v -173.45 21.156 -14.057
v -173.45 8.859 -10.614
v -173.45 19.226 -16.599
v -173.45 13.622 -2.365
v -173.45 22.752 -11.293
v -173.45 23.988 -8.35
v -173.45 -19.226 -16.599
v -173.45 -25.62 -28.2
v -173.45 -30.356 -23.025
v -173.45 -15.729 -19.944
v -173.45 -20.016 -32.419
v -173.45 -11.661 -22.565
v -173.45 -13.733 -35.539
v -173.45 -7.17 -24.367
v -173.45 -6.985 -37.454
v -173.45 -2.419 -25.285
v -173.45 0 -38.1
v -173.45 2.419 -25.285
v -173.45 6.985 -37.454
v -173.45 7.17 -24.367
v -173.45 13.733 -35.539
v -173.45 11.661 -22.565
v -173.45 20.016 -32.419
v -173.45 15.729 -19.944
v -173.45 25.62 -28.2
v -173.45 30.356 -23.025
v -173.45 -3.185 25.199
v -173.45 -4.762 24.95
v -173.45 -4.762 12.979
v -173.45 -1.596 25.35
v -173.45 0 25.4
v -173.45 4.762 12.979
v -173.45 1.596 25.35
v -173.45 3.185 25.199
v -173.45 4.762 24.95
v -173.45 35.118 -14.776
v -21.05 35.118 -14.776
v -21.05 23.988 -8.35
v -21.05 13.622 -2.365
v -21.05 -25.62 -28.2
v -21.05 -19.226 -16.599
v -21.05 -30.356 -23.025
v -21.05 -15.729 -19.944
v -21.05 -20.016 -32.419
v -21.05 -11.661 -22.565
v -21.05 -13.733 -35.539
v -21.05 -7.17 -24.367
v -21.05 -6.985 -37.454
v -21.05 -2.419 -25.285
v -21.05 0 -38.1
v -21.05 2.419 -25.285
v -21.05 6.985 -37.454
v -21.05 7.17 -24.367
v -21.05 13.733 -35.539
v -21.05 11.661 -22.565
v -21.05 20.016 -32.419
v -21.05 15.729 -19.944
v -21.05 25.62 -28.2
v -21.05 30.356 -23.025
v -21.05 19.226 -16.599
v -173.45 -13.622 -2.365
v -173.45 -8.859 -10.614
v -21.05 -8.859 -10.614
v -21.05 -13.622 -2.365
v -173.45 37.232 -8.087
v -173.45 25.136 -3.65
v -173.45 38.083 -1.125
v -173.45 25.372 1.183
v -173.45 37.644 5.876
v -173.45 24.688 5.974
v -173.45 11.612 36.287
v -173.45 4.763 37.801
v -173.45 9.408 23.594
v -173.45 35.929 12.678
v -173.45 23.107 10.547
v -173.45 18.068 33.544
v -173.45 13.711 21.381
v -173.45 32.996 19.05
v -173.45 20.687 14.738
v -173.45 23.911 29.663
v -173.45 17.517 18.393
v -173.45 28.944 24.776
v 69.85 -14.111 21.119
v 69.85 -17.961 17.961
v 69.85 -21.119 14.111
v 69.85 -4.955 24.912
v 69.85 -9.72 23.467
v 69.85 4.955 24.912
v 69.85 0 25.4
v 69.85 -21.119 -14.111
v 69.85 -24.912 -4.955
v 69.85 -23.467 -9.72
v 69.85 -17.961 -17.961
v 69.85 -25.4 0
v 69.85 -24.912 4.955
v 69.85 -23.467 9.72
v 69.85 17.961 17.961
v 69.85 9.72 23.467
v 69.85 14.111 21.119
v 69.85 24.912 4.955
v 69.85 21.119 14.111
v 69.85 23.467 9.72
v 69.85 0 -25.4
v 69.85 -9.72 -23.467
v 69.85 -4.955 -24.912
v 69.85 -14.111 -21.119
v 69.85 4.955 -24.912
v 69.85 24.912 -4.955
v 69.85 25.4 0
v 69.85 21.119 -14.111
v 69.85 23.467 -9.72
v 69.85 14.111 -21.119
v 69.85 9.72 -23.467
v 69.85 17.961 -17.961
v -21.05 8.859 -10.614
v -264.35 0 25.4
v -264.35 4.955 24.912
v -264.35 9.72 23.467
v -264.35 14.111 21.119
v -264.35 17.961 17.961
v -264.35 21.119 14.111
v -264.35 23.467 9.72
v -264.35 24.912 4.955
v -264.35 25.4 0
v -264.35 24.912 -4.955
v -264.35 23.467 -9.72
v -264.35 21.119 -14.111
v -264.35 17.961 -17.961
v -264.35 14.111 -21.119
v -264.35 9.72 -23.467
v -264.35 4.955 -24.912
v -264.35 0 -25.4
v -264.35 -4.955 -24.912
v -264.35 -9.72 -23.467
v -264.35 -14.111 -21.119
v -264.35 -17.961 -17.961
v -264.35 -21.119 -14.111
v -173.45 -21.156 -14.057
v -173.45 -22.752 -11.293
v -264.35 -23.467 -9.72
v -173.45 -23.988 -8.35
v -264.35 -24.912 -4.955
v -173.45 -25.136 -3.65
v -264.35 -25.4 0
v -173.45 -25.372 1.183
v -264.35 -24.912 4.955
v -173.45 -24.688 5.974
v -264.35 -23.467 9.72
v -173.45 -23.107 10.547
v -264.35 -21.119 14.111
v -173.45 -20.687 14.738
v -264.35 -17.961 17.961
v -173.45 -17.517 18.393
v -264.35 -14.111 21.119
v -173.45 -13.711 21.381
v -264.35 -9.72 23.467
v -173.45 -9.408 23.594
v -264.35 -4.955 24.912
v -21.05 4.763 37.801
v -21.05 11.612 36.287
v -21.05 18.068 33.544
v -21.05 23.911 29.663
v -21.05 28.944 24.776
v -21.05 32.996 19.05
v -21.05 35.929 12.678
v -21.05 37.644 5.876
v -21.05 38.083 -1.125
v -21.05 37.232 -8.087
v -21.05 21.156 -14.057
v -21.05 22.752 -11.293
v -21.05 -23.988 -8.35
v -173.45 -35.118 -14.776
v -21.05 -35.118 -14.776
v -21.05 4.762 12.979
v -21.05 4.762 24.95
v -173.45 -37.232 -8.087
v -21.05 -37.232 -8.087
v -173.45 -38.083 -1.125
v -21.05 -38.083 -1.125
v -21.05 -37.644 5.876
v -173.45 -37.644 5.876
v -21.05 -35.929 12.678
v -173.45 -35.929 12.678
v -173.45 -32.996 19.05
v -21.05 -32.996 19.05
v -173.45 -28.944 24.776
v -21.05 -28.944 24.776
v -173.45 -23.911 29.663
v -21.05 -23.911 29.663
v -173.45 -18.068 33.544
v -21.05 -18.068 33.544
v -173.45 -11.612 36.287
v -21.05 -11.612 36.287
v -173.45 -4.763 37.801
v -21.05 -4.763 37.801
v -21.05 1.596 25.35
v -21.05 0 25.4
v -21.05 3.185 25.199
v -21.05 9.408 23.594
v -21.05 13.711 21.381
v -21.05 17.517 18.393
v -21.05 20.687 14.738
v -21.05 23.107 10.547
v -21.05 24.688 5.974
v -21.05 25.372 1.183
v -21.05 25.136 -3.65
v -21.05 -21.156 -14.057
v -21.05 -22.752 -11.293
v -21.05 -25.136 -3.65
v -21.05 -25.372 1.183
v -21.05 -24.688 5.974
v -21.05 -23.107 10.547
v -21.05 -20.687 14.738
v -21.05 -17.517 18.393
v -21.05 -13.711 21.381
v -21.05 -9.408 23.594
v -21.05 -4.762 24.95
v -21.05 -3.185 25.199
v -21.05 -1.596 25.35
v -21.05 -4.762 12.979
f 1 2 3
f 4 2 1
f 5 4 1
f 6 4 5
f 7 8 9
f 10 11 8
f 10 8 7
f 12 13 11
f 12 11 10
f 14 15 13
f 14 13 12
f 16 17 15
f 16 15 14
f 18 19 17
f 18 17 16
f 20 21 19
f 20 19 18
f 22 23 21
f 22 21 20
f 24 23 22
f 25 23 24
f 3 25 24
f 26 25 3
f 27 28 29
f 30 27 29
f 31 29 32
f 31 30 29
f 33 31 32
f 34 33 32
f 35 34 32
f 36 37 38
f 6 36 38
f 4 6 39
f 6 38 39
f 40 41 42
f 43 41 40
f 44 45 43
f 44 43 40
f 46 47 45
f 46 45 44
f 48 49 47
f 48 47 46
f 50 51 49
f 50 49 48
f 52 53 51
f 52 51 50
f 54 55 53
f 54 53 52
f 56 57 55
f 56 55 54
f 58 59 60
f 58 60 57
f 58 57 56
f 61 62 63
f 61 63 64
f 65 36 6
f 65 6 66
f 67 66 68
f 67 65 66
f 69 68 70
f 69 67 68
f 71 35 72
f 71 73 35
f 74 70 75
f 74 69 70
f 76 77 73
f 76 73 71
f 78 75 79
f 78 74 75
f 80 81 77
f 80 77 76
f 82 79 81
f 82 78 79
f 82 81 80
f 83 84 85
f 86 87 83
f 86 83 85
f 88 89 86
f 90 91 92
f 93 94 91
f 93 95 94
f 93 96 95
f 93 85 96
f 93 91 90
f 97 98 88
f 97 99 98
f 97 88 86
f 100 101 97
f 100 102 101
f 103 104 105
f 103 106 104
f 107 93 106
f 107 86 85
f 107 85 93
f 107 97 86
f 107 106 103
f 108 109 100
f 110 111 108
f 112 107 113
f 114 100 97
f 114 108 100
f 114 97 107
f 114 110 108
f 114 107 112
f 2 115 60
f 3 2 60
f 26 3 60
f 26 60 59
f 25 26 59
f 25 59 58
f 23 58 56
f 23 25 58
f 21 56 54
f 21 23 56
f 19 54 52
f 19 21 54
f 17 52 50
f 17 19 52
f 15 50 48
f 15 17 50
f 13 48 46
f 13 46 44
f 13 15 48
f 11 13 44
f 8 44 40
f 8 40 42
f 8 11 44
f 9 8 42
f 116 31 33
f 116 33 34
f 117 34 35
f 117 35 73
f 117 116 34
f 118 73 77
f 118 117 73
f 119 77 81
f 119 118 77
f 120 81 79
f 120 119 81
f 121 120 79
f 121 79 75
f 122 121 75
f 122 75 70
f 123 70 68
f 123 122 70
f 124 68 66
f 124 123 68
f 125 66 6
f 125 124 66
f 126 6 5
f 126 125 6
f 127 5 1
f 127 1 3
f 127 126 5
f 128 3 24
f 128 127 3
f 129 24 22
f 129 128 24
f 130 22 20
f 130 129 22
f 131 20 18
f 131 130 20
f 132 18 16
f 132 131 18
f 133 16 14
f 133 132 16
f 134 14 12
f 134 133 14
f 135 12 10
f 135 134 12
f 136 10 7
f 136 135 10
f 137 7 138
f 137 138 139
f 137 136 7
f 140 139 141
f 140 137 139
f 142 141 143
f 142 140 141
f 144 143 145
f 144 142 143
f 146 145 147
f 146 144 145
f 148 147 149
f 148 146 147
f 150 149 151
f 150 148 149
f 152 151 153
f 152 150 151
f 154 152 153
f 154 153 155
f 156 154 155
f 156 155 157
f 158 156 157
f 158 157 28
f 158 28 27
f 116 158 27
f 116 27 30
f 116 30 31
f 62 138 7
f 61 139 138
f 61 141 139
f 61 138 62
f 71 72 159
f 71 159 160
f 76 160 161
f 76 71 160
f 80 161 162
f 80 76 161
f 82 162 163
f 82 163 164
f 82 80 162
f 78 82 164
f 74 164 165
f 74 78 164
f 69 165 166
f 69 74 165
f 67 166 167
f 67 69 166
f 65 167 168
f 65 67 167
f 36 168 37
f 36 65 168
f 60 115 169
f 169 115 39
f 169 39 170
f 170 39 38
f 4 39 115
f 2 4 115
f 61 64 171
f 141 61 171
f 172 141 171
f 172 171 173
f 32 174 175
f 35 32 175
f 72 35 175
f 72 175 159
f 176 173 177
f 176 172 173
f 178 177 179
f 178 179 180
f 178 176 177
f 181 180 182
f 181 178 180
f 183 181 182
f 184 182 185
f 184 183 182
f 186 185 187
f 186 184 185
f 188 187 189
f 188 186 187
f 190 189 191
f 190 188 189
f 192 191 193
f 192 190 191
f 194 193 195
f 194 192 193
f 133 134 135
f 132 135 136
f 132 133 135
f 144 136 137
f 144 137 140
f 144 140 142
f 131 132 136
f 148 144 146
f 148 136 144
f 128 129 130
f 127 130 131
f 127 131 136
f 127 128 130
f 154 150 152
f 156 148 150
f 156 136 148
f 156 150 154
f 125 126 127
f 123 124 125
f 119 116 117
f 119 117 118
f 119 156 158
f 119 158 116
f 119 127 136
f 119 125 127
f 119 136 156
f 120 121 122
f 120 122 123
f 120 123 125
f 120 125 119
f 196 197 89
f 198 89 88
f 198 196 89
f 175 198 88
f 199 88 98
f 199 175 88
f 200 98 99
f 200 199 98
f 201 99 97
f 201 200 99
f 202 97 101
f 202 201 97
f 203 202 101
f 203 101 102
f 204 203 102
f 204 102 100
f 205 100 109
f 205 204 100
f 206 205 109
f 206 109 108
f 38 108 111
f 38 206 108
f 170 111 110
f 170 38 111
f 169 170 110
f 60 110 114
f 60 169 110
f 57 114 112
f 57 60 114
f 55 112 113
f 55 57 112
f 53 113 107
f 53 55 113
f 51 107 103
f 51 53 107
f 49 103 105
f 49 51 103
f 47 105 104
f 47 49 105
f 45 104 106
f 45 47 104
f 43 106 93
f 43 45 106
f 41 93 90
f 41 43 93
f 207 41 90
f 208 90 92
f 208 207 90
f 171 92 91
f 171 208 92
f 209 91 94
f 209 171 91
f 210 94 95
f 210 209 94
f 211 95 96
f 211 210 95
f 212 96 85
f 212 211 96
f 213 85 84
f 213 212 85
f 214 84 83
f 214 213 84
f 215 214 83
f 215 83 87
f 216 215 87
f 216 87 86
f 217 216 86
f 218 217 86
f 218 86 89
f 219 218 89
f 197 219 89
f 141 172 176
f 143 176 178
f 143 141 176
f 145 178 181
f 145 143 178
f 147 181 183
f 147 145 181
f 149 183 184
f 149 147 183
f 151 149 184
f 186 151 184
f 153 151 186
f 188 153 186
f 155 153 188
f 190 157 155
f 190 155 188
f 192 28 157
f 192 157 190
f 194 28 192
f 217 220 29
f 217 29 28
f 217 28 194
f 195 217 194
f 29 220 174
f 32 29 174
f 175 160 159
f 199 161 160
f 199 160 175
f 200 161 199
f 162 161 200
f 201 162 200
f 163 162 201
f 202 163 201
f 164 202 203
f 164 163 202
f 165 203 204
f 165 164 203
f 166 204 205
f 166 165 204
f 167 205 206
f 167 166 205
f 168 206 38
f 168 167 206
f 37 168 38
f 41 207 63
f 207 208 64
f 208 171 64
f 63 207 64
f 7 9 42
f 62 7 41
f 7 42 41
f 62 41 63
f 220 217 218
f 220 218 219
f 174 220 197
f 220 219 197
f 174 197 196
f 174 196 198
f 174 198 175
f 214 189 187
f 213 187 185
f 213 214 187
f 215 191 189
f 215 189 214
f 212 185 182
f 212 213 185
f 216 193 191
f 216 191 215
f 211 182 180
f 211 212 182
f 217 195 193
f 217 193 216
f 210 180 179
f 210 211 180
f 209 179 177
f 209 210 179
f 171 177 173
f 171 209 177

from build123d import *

# Parameters (mm, degrees)
F3_W     = 9.525
F3_H     = 25.1206
F4_DEPTH = 152.4


with BuildPart() as f1:
    # F0 (on Front) → F1 (revolve)
    with BuildSketch(Plane.XZ):
        Polygon((0, 0), (69.85, 0), (69.85, 25.4), (-21.05, 25.4), (-21.05, 38.1), (-97.25, 38.1), (-97.25, 0), align=None)
        Polygon((-264.35, 0), (-97.25, 0), (-97.25, 38.1), (-173.45, 38.1), (-173.45, 25.4), (-264.35, 25.4), align=None)
    revolve(axis=Axis((-97.25, 0, 0), (-1, 0, 0)))

    # F3 (on face) → F4 (cut, through all)
    with BuildSketch(Plane.YZ.offset(-21.05)):
        with Locations((0, 25.5397)):
            Rectangle(F3_W, F3_H)
        Polygon((-30.614318, -23.174446), (-8.85924, -10.614146), (-13.62174, -2.365254), (-35.376818, -14.925554), align=None)
        Polygon((35.376818, -14.925554), (13.62174, -2.365254), (8.85924, -10.614146), (30.614318, -23.174446), align=None)
    extrude(amount=-F4_DEPTH, mode=Mode.SUBTRACT)


solid = f1.part
